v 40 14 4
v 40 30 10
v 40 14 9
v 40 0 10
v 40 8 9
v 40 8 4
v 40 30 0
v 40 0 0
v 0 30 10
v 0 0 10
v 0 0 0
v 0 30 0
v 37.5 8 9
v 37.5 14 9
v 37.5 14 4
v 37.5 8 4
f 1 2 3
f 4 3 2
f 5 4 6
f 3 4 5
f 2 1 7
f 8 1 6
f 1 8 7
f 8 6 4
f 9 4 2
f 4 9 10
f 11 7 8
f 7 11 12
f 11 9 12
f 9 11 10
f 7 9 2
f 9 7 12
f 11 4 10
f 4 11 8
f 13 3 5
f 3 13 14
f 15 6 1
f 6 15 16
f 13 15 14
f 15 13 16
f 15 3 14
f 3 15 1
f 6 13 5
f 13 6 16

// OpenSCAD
// units=mm — generated by scad_emitter.py
// part=unnamed
$fn = 48;

difference() { cube([40, 30, 10]); translate([37.5, 8, 4]) cube([3, 6, 5]); }
